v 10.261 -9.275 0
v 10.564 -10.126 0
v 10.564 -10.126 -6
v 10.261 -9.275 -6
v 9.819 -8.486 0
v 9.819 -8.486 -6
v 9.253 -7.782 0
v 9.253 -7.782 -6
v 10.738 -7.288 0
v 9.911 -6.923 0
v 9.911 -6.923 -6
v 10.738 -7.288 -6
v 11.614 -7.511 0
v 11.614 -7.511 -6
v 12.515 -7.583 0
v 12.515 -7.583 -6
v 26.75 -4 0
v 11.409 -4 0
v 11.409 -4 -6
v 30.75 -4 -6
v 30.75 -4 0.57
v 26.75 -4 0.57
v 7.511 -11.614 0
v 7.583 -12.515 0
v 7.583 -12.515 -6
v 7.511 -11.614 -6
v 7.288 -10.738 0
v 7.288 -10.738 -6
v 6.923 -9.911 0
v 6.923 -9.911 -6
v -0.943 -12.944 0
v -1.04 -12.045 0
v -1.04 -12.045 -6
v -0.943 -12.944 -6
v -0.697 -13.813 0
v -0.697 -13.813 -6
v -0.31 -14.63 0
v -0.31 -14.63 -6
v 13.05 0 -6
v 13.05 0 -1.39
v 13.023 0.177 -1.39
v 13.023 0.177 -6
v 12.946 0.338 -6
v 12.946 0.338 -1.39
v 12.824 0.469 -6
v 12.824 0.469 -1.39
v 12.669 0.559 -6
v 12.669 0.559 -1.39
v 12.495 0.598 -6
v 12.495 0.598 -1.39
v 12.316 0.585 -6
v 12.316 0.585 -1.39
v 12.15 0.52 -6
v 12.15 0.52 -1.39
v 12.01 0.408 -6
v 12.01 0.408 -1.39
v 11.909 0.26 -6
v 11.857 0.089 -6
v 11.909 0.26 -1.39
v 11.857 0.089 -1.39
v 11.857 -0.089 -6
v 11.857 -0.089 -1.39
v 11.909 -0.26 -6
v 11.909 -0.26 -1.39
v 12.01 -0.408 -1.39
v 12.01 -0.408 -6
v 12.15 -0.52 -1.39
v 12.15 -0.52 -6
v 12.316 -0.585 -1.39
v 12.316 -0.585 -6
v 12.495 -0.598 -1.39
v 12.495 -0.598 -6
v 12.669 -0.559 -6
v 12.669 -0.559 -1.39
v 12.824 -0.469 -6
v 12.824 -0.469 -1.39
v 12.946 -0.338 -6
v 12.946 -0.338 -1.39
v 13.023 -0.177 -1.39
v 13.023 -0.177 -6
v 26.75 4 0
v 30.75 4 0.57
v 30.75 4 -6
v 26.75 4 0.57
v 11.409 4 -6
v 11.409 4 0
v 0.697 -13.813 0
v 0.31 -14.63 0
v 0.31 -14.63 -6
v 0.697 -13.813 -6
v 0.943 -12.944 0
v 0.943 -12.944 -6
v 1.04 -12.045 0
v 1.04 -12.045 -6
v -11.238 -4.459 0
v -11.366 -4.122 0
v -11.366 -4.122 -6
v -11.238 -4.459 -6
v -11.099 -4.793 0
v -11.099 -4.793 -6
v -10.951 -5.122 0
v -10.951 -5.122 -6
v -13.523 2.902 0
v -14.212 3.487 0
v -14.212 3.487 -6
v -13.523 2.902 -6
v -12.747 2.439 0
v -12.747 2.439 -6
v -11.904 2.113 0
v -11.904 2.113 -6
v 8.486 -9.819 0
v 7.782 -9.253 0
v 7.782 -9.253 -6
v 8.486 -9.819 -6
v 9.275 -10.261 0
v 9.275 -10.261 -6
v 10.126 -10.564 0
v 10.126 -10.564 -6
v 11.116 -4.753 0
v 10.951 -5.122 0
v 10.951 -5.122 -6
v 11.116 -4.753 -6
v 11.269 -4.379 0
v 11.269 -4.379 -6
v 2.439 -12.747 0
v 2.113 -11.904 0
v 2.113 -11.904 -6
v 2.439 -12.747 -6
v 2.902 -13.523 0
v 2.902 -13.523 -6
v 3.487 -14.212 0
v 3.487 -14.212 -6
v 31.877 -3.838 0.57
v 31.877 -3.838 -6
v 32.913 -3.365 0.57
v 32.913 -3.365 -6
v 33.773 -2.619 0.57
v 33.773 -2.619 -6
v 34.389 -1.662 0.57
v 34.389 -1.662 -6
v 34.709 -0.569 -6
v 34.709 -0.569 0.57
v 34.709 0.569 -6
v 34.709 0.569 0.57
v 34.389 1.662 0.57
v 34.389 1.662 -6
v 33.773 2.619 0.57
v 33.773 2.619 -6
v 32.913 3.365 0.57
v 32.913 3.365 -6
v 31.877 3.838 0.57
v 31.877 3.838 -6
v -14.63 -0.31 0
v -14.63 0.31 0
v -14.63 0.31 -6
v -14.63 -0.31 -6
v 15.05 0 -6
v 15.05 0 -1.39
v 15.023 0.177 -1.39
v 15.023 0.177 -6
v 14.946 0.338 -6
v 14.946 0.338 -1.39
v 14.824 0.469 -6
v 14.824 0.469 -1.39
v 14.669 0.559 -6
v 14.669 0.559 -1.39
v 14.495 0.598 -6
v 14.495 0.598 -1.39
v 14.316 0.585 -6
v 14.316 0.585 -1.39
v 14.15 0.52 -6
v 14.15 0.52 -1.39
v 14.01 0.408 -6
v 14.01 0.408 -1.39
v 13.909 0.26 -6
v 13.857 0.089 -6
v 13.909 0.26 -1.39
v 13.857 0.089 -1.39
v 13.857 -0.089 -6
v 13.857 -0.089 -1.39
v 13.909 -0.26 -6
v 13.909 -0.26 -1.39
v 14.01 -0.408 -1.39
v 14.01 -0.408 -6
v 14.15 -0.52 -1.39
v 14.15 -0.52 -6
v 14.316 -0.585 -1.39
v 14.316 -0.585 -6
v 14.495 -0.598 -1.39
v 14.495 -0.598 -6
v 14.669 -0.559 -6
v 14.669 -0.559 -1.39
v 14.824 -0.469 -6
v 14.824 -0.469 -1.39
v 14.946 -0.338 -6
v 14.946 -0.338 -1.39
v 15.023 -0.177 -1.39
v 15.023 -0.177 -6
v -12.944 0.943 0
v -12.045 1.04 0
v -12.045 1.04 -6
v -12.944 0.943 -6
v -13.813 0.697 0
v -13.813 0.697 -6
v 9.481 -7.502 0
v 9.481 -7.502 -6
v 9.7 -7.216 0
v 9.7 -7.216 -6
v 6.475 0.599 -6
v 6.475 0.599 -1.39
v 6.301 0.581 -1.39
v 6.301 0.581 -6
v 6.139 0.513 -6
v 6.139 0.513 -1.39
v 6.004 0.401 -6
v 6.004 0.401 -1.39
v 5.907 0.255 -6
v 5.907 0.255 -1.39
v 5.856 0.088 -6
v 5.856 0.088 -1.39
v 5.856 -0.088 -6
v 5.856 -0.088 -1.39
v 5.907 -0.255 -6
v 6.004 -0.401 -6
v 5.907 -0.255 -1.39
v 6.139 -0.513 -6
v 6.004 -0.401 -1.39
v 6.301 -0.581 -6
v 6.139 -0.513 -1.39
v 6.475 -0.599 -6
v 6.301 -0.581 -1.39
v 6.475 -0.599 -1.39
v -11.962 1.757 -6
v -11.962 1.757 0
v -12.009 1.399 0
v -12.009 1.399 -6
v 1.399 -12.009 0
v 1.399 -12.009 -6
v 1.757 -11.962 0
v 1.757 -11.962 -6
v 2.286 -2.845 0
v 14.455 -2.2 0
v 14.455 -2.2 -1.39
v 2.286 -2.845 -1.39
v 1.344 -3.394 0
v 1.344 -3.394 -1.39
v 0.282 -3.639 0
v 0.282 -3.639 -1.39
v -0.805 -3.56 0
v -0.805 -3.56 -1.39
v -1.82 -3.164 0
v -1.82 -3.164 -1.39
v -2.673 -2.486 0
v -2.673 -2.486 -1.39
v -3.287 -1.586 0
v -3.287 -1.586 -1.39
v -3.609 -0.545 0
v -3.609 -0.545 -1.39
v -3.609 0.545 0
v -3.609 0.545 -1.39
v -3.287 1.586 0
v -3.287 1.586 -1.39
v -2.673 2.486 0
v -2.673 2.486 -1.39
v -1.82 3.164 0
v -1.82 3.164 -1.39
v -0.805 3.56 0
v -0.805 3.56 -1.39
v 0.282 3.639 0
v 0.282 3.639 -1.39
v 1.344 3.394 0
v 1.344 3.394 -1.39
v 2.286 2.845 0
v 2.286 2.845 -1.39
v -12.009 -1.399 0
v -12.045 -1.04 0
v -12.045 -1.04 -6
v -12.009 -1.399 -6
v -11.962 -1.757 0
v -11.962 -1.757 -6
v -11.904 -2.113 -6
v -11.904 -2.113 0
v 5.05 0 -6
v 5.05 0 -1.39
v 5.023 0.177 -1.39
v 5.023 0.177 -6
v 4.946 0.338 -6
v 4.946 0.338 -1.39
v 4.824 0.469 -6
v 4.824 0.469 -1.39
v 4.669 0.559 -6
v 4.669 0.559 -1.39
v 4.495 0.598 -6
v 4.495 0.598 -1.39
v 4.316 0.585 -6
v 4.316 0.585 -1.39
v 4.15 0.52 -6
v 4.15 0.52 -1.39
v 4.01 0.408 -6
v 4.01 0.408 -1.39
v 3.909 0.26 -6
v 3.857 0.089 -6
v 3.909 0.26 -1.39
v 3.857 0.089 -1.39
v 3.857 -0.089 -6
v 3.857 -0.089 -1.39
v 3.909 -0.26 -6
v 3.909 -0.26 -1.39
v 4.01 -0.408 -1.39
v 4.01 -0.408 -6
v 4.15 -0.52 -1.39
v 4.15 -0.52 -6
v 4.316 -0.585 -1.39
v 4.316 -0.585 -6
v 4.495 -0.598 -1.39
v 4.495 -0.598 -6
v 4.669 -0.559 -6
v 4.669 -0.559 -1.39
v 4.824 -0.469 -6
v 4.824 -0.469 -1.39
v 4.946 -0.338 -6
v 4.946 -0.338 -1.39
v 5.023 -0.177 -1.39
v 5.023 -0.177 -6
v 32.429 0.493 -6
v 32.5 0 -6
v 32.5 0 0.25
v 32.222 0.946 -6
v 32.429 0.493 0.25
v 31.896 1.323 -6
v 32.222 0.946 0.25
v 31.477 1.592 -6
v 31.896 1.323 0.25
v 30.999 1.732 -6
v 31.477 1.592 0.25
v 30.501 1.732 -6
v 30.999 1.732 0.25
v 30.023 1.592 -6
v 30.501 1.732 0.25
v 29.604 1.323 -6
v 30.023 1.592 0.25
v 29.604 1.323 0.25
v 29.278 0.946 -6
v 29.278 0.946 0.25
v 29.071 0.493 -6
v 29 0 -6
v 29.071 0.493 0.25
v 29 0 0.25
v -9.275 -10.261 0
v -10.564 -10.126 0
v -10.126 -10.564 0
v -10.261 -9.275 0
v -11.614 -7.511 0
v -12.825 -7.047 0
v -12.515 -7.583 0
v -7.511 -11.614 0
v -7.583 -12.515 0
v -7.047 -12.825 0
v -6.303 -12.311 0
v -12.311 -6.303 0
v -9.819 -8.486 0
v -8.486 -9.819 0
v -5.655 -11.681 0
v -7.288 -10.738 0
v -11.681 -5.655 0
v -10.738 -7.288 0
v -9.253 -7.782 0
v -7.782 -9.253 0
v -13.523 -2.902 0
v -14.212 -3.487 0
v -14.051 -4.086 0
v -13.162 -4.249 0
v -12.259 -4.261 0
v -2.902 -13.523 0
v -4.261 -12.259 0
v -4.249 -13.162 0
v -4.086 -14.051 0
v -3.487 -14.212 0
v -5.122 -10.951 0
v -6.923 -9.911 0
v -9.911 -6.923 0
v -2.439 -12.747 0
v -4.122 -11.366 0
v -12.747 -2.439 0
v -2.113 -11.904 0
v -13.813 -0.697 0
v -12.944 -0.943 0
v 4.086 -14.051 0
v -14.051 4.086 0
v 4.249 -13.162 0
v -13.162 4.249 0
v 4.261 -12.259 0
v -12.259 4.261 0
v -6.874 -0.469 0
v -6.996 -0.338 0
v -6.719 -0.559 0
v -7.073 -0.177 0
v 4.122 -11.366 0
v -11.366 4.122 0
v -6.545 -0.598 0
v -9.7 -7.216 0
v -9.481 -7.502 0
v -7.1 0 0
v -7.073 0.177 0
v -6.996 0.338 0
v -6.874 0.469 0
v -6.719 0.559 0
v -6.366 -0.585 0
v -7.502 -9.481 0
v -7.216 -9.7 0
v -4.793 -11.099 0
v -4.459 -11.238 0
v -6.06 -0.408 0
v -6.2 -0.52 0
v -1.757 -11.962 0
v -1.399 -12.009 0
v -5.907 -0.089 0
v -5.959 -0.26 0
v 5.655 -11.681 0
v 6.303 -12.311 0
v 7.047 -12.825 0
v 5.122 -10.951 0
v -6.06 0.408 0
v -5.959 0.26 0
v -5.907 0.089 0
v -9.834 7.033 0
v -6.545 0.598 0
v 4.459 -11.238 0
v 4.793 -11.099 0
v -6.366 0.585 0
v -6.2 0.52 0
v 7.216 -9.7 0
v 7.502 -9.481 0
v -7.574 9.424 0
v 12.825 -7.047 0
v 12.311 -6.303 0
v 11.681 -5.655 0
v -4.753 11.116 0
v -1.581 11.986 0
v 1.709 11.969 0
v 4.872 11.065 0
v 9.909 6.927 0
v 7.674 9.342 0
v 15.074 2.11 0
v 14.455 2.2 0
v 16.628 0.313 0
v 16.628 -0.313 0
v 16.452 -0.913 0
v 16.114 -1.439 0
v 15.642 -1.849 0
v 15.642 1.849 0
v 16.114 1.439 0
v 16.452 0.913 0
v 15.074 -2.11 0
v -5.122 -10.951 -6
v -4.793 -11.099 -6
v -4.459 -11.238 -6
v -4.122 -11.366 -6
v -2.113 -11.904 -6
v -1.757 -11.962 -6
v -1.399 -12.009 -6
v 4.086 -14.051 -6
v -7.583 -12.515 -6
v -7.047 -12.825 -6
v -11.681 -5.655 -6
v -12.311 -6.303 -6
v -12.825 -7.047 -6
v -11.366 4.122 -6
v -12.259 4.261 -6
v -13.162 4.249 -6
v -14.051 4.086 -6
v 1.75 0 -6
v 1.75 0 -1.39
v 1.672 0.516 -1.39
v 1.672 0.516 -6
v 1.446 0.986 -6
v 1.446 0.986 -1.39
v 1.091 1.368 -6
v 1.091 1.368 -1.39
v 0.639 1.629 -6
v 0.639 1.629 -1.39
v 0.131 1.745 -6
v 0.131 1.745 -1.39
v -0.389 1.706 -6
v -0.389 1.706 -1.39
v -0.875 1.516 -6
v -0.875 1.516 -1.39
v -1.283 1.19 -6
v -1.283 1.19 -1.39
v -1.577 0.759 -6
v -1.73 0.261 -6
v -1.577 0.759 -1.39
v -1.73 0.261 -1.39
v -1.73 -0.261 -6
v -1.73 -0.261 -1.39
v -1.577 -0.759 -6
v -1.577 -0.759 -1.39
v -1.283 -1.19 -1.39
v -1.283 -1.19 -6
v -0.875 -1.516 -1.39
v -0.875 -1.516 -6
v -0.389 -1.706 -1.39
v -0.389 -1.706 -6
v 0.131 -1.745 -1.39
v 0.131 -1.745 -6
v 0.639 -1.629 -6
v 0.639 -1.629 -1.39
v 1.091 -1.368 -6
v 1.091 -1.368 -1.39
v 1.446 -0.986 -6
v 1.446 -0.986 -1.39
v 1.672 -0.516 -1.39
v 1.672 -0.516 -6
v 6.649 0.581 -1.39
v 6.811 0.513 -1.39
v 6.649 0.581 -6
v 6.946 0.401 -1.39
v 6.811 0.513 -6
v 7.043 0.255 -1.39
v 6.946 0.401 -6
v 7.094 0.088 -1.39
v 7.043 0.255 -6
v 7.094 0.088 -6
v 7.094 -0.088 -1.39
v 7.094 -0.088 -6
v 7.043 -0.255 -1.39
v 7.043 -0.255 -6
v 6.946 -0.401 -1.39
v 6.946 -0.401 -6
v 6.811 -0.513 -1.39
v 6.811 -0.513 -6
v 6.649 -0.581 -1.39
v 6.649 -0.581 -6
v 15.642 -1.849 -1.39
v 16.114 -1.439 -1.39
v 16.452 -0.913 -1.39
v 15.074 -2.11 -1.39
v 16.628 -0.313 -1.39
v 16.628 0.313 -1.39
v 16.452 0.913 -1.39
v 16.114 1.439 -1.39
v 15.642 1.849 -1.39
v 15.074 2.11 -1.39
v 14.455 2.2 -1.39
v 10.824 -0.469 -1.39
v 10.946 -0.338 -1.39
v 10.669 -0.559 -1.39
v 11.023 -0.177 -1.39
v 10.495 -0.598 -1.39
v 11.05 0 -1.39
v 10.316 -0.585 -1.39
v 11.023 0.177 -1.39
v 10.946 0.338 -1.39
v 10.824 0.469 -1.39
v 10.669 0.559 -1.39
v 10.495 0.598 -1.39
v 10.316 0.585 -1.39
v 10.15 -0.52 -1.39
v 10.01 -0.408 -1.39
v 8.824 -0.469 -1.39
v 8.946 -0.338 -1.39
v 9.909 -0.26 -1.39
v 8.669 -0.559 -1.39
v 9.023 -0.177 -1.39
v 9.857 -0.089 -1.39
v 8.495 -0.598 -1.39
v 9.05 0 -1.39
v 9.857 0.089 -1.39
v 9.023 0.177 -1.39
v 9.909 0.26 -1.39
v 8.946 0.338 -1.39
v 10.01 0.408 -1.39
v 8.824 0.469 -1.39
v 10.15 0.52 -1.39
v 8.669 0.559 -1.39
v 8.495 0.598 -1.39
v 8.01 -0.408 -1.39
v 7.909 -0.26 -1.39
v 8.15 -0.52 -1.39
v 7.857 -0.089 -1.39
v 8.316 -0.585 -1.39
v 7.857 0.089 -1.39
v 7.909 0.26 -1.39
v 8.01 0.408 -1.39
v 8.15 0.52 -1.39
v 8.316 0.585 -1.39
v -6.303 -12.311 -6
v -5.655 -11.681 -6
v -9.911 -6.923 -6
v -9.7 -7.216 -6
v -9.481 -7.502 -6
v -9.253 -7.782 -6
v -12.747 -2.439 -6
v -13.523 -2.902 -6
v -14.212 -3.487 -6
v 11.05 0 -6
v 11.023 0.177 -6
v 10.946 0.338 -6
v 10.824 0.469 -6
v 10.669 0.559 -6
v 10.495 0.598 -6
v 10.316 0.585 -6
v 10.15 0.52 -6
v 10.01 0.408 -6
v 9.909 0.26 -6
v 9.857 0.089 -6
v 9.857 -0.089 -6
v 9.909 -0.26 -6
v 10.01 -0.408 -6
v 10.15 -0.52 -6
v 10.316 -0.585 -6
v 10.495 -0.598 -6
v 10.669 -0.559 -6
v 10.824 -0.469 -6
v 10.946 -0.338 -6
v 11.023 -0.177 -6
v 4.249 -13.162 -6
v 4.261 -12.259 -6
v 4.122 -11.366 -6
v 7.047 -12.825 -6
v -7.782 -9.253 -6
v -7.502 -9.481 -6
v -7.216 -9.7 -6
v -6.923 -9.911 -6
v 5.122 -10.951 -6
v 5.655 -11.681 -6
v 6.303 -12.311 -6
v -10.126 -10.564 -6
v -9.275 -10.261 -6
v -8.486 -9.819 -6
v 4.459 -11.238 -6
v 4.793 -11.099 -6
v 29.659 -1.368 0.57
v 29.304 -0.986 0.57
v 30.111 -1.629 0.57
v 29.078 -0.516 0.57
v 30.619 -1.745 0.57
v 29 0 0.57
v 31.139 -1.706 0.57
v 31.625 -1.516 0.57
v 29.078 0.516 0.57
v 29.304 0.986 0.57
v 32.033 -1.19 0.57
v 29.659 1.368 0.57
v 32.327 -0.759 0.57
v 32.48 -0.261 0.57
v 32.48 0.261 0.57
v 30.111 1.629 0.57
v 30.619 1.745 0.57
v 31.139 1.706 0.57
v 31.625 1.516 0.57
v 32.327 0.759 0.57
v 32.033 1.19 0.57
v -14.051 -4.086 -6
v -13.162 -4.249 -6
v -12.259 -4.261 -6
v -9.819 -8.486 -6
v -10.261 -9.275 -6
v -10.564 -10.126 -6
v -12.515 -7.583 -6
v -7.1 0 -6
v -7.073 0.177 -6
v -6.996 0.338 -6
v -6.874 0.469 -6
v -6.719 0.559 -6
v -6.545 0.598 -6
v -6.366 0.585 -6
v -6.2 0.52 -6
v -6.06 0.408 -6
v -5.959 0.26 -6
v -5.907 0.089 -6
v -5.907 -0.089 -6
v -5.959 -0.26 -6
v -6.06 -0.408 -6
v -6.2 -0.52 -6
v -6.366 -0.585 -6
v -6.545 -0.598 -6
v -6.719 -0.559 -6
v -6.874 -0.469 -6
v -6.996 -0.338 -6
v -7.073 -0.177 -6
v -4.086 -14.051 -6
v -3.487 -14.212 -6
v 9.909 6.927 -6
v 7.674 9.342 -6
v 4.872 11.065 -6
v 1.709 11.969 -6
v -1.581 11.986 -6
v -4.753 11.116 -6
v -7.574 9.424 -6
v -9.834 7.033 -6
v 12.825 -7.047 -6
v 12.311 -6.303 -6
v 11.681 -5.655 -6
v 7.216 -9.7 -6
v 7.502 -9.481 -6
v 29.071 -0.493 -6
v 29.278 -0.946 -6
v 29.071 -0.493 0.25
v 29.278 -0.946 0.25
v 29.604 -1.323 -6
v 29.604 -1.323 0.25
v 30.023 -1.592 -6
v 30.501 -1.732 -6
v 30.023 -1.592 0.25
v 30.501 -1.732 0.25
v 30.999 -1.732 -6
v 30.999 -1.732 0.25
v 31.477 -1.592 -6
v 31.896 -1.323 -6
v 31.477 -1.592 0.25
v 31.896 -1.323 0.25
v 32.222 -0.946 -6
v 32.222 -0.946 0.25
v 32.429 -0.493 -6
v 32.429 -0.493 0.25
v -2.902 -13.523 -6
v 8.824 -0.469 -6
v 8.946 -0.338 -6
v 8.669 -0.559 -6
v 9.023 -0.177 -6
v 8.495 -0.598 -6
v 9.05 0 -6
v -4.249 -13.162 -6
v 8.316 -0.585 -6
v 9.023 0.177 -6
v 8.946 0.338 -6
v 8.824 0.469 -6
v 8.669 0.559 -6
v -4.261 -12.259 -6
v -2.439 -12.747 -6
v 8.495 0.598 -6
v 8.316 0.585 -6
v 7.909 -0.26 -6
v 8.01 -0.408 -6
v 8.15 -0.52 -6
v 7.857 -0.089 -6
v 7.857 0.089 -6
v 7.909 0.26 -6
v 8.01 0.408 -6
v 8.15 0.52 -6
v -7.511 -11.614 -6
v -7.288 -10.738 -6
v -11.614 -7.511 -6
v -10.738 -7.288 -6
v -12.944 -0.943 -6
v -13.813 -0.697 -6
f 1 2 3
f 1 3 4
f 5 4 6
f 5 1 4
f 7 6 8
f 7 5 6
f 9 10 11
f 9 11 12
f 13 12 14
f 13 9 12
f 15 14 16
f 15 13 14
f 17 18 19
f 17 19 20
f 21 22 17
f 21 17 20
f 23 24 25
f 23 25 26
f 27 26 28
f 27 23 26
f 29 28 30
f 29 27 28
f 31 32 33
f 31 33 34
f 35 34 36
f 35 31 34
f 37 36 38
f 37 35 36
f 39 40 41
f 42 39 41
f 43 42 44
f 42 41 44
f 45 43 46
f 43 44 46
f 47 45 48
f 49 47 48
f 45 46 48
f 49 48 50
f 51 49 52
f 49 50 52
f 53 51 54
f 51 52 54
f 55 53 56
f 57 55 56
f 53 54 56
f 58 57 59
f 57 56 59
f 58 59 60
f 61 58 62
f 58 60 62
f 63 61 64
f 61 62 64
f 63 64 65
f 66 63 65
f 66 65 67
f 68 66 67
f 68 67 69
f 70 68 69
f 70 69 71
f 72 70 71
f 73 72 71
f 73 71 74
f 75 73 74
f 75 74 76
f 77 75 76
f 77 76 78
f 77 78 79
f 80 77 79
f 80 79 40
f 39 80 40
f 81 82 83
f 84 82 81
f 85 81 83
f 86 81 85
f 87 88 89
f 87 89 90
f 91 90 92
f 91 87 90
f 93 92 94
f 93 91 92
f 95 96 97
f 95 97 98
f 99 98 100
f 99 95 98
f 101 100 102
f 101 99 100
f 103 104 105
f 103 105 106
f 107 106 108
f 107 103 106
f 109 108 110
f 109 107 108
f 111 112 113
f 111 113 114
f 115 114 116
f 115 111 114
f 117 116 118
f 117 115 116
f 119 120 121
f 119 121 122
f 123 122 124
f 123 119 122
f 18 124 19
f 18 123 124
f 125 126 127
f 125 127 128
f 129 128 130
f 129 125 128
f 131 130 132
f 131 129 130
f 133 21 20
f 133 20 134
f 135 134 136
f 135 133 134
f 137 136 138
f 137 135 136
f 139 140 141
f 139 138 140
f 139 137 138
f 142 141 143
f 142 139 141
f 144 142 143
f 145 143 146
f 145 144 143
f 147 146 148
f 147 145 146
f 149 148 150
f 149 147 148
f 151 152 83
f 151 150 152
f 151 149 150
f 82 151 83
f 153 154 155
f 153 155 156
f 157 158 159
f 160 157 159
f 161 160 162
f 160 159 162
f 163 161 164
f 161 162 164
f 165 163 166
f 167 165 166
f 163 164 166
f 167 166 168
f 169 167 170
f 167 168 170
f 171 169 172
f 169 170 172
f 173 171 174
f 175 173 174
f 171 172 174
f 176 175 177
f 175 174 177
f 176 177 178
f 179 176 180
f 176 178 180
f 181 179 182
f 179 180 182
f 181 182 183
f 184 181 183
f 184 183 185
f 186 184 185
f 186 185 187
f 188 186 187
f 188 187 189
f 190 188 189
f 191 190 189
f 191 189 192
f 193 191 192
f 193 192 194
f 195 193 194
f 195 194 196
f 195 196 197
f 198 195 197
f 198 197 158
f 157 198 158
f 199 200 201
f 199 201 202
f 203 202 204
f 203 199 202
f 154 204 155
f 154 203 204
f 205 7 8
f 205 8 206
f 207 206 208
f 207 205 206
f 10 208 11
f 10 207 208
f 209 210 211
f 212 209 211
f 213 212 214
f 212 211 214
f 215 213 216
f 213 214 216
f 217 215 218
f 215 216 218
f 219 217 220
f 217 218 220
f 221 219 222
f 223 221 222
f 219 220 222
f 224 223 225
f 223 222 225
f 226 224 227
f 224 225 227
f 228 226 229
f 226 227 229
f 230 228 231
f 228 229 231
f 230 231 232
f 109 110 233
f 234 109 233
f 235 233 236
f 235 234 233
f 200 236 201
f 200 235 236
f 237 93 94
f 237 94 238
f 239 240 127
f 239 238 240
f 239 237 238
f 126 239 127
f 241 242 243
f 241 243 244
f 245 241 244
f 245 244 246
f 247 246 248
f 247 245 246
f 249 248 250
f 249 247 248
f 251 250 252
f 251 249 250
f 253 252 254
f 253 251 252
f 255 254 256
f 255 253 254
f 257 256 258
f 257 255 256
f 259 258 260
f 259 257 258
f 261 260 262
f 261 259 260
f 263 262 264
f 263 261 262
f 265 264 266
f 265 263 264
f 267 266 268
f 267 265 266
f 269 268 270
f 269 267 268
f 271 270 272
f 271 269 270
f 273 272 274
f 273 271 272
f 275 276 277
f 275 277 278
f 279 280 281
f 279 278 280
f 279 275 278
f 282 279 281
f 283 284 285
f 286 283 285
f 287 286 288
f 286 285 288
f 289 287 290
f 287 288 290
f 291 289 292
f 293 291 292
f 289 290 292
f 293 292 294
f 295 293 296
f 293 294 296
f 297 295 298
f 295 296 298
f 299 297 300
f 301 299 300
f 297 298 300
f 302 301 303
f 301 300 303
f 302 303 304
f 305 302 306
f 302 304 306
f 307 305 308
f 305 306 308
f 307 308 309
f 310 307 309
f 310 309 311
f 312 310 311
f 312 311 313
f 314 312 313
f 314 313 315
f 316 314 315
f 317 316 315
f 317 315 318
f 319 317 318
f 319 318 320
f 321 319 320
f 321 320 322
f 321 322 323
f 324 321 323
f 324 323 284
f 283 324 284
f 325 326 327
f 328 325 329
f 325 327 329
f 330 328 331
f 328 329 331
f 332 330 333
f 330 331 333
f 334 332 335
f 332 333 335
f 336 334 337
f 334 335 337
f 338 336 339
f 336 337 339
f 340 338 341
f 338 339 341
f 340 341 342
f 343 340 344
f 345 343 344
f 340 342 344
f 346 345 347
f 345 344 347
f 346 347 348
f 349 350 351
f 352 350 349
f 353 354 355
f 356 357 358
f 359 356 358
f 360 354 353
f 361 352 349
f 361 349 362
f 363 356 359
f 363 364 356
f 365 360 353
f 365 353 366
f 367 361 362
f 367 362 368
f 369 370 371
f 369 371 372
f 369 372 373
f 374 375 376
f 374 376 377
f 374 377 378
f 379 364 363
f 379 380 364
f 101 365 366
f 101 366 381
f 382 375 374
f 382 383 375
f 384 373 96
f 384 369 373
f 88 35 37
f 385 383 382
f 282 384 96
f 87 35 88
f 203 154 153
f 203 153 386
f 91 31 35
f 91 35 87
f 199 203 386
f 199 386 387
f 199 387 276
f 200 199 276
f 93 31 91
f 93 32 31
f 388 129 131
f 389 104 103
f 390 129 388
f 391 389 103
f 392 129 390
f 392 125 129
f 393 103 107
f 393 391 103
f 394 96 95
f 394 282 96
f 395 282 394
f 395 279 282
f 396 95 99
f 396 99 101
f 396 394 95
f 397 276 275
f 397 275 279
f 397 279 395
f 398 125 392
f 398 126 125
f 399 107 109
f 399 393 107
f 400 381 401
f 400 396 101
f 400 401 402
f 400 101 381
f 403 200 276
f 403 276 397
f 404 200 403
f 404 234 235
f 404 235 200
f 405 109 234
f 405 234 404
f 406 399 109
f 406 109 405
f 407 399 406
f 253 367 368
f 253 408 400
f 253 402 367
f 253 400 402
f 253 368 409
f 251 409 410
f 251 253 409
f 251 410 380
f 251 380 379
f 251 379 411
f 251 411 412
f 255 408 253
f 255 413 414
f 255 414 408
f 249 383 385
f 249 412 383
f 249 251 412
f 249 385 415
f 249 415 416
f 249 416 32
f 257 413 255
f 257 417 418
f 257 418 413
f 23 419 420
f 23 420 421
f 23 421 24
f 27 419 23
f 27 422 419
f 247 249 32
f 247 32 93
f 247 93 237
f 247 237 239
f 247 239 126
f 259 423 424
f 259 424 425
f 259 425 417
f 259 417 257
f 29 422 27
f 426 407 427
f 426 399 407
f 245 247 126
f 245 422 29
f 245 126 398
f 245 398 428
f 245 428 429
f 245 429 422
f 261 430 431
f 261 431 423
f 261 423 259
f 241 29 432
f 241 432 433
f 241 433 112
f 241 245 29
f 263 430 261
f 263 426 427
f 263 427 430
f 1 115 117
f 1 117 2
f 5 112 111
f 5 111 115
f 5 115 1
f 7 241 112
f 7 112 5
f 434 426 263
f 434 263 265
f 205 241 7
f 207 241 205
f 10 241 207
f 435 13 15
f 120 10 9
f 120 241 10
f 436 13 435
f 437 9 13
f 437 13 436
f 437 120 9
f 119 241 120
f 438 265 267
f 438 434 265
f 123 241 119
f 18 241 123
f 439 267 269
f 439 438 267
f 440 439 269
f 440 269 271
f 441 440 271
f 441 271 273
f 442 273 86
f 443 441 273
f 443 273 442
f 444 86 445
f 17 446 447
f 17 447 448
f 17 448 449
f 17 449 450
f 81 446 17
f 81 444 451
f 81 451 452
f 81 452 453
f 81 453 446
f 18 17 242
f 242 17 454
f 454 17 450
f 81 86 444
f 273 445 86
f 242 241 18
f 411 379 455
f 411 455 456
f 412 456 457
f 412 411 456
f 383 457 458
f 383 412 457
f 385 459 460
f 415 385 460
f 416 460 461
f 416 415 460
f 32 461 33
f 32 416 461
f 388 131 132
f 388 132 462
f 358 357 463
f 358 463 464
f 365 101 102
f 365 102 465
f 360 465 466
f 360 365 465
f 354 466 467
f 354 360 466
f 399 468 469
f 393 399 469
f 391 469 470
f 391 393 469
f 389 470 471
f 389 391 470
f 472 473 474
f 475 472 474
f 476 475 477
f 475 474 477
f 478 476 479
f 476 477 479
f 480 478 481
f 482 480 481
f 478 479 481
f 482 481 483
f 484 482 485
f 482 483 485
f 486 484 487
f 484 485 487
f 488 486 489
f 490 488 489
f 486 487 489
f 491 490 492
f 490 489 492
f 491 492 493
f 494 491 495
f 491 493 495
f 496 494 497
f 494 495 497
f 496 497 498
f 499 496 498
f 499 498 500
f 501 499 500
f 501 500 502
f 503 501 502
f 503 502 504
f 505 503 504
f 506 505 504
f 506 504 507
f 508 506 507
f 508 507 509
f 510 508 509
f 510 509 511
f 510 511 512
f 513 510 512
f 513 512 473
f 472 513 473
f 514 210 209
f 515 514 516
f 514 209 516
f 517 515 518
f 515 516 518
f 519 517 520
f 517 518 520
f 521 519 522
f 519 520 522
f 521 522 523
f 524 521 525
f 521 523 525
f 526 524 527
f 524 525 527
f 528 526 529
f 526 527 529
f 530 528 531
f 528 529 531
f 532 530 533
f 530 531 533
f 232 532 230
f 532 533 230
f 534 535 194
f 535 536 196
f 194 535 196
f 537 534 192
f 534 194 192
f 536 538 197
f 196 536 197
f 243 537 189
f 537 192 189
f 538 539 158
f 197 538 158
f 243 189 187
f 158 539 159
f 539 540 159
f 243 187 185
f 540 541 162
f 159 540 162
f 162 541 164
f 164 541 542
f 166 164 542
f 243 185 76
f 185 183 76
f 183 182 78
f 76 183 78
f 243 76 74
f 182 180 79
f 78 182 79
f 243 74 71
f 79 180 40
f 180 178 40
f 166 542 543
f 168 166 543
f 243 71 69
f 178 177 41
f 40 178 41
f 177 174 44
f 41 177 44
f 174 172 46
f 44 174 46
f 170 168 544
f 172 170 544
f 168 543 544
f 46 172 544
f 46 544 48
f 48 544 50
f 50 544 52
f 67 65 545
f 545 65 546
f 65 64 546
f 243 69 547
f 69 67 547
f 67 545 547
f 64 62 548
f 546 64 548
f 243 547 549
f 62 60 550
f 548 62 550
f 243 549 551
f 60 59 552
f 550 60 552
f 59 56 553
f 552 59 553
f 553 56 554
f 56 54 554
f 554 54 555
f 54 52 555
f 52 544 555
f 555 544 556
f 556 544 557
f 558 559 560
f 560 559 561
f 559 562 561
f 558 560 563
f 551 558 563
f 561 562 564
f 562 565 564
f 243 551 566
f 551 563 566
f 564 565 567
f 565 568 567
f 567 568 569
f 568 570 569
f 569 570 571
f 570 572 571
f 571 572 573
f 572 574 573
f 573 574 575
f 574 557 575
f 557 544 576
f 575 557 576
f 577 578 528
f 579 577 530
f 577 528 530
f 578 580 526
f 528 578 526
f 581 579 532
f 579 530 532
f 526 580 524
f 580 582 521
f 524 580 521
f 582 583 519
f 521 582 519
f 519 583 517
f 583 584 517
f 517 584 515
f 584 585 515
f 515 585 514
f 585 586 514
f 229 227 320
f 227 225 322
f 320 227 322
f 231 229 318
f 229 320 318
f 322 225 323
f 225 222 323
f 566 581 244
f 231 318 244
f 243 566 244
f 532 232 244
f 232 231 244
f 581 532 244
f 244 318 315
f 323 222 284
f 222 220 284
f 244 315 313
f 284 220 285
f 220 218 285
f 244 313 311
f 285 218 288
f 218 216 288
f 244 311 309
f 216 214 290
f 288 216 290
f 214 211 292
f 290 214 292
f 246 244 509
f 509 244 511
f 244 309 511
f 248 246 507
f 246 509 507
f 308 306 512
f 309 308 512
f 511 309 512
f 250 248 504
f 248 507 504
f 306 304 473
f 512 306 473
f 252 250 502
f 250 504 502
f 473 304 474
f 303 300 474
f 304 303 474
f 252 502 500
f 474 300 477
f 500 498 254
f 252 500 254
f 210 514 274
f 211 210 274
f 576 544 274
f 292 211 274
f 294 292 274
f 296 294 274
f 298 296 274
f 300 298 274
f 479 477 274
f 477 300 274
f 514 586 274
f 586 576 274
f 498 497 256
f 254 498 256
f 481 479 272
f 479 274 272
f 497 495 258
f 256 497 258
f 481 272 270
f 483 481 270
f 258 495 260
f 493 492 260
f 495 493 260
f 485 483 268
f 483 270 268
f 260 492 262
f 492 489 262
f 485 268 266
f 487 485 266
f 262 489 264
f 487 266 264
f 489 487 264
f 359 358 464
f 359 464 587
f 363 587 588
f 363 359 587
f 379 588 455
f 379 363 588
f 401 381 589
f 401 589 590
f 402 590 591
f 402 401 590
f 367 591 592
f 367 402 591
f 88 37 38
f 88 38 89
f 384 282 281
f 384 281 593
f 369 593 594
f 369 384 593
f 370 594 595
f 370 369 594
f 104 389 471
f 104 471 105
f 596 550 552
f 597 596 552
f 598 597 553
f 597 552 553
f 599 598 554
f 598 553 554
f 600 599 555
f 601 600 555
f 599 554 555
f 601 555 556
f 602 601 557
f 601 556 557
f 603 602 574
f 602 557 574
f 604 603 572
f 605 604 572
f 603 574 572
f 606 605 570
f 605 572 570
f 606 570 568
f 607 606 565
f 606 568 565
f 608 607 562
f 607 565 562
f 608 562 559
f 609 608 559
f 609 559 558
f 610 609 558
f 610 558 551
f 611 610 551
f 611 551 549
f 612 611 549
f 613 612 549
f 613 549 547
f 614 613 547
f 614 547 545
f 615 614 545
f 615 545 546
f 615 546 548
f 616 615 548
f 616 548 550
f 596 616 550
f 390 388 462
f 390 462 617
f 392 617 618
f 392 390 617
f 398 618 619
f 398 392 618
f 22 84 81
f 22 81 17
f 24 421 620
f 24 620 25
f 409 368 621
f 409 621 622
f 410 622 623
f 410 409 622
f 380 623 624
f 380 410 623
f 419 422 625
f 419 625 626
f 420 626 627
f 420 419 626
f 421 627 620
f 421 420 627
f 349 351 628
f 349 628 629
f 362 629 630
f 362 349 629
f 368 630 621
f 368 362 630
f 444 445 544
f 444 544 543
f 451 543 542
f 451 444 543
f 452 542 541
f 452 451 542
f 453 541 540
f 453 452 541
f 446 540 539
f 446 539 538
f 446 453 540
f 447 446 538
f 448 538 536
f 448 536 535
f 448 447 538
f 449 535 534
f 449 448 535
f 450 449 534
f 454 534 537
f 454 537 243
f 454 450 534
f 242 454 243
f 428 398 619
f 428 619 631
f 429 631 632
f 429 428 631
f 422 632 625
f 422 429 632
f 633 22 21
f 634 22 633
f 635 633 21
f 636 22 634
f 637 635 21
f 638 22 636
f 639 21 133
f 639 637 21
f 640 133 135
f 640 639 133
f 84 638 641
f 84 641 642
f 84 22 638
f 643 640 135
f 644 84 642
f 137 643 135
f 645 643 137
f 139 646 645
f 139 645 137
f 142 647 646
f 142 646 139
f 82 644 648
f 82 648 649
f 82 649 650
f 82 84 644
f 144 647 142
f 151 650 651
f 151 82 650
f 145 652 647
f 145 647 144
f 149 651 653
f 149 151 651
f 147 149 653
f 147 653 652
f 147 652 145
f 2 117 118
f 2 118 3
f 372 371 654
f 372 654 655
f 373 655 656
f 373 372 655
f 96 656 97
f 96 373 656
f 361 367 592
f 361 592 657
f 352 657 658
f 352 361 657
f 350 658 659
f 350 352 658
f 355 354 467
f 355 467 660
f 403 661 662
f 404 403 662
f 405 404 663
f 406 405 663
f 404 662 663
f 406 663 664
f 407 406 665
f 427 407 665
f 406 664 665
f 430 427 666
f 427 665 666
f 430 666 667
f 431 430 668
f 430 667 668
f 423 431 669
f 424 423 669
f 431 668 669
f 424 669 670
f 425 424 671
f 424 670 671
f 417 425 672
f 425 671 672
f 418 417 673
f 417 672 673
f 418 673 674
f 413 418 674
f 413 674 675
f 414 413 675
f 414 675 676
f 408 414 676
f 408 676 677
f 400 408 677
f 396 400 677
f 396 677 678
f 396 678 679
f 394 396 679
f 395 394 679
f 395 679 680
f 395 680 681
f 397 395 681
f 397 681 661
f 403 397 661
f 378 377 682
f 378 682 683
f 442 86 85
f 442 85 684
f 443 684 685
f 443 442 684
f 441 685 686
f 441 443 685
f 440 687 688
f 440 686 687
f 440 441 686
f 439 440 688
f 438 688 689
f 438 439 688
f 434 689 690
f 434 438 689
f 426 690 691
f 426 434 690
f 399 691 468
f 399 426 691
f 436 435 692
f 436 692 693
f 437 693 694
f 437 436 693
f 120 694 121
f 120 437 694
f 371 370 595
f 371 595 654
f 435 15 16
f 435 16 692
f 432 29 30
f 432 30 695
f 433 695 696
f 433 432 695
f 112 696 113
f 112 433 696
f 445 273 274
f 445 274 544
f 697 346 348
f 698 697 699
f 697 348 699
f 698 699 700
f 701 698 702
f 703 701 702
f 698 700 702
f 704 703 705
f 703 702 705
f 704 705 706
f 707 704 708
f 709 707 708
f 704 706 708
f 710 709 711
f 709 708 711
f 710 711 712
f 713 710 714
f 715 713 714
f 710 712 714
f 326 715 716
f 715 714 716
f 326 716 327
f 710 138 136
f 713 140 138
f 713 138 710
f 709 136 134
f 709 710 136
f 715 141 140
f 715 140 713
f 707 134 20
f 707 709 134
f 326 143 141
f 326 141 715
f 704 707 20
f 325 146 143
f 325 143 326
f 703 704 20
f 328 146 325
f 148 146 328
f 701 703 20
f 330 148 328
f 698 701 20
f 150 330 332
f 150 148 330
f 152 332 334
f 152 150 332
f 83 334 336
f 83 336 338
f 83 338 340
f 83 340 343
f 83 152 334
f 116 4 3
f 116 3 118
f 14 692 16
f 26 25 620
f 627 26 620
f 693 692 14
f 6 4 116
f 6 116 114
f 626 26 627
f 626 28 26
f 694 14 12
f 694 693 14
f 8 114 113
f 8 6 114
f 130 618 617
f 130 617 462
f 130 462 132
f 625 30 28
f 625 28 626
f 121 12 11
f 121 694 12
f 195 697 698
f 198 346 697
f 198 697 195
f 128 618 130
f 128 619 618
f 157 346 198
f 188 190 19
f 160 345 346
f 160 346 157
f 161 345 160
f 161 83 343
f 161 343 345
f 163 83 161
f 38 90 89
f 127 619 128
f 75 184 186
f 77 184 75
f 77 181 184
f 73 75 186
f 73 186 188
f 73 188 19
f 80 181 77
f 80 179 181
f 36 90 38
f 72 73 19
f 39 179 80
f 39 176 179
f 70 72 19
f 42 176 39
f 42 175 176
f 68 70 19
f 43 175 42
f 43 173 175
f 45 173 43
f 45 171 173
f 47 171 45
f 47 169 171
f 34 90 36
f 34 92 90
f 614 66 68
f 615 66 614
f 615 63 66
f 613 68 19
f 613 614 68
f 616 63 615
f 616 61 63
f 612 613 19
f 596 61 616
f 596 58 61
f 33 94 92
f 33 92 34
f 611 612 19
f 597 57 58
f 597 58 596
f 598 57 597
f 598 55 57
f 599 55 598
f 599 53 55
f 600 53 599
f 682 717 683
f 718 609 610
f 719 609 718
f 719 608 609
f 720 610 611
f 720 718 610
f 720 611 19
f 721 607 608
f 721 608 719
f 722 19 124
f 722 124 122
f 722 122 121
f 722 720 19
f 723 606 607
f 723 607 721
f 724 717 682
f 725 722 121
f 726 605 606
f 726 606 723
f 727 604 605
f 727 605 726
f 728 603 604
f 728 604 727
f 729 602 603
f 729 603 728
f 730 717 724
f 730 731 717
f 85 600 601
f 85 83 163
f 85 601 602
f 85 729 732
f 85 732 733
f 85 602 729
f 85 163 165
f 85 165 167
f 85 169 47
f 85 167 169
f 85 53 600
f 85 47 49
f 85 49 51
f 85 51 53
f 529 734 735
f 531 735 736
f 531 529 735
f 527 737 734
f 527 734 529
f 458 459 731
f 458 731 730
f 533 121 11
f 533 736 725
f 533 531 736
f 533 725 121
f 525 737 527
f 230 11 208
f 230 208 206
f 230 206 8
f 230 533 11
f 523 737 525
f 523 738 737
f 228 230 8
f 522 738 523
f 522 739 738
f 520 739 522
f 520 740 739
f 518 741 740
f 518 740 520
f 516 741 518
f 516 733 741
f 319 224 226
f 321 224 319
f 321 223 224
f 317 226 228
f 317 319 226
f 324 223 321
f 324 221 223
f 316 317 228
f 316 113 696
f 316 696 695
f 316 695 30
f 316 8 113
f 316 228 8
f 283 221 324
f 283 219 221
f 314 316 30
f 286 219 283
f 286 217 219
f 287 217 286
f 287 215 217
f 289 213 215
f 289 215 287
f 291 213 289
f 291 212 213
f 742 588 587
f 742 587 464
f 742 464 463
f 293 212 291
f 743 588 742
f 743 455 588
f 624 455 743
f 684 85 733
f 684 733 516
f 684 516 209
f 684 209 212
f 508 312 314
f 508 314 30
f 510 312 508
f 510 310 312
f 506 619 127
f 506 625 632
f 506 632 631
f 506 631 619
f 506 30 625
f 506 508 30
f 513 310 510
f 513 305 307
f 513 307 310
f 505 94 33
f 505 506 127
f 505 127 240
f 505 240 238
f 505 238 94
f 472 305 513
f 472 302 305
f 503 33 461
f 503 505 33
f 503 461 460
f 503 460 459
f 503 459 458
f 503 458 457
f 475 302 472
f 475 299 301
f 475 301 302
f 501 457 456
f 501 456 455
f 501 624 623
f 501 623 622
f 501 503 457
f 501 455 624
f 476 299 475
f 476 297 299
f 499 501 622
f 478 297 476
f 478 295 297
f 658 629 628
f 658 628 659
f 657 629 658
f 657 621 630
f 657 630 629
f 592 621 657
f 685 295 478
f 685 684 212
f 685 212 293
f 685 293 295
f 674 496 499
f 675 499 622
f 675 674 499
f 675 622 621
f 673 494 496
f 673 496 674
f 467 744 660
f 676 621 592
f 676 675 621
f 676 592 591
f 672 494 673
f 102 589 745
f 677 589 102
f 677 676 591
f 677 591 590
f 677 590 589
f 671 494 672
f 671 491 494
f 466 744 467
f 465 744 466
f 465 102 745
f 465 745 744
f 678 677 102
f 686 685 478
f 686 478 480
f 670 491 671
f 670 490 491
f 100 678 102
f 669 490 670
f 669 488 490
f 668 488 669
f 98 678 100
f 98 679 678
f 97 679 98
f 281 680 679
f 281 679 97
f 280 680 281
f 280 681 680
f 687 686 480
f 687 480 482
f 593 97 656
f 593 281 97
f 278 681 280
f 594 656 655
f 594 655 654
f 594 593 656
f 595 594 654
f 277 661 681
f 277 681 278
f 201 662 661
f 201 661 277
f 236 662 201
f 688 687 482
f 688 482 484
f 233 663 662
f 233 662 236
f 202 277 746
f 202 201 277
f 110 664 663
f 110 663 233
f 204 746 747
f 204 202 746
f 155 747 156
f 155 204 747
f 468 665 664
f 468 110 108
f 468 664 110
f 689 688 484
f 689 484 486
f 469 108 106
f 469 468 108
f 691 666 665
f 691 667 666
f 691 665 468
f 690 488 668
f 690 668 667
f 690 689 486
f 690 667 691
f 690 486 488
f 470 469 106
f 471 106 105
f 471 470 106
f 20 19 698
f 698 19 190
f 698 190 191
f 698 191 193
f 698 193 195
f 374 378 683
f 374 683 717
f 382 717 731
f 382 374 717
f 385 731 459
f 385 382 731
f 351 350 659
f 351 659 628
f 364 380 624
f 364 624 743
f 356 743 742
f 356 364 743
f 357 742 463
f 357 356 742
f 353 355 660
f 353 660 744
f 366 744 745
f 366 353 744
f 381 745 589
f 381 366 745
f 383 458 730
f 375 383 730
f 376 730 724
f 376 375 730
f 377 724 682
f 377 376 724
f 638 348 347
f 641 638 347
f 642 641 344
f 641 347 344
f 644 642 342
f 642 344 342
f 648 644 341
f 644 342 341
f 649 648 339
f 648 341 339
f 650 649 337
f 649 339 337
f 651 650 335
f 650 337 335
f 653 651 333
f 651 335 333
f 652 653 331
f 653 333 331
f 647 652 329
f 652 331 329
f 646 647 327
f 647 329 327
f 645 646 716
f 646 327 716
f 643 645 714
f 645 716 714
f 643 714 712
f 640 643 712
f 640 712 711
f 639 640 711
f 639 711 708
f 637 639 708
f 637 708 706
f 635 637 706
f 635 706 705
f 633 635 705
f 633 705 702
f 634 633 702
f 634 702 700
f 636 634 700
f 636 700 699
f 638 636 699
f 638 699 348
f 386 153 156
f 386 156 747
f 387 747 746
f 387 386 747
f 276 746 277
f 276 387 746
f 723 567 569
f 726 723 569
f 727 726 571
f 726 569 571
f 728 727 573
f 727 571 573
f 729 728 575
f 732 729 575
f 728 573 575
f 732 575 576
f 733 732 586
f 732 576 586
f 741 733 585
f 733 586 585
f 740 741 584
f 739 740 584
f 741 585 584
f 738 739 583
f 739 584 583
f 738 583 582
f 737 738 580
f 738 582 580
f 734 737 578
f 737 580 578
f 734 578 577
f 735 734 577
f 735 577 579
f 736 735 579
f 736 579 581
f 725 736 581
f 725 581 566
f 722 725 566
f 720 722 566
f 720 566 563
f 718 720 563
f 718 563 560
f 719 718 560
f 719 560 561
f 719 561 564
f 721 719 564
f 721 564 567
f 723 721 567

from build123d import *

# Parameters (mm, degrees)
SKETCH2_R           = 1.75
BOSS_EXTRUDE1_DEPTH = 10
SKETCH10_R          = 0.6
CUT_EXTRUDE1_DEPTH  = 40.007683858
CUT_EXTRUDE3_START  = -4
CUT_EXTRUDE3_DEPTH  = 4
BOSS_EXTRUDE2_START = 0.25
BOSS_EXTRUDE2_DEPTH = 0.25
SKETCH13_R          = 1.75
CUT_EXTRUDE11_DEPTH = 39.178520139
SKETCH28_R          = 0.6
CUT_EXTRUDE12_DEPTH = 39.178520139
CUT_EXTRUDE14_DEPTH = 1.39
BOSS_EXTRUDE3_START = 0.32
BOSS_EXTRUDE3_DEPTH = 0.32
SKETCH32_R          = 1.75
CUT_EXTRUDE18_DEPTH = 39.272239286


with BuildPart() as part:
    # Sketch2 → Boss-Extrude1 (new body)
    with BuildSketch(Plane.XY):
        with BuildLine():
            ThreePointArc((-11.365584201, 4.122086336), (-12.71070456, 4.273667417), (-14.051260935, 4.085959636))
            Line((-14.051260935, 4.085959636), (-14.211728743, 3.487085624))
            ThreePointArc((-14.211728743, 3.487085624), (-13.144626757, 2.65424773), (-11.903927815, 2.112960617))
            ThreePointArc((-11.903927815, 2.112960617), (-11.986568374, 1.578061664), (-12.04518576, 1.04))
            ThreePointArc((-12.04518576, 1.04), (-13.383704325, 0.838273314), (-14.63, 0.31))
            Line((-14.63, 0.31), (-14.63, -0.31))
            ThreePointArc((-14.63, -0.31), (-13.383704325, -0.838273314), (-12.04518576, -1.04))
            ThreePointArc((-12.04518576, -1.04), (-11.986568374, -1.578061664), (-11.903927815, -2.112960617))
            ThreePointArc((-11.903927815, -2.112960617), (-13.144626757, -2.65424773), (-14.211728743, -3.487085624))
            Line((-14.211728743, -3.487085624), (-14.051260935, -4.085959636))
            ThreePointArc((-14.051260935, -4.085959636), (-12.71070456, -4.273667417), (-11.365584201, -4.122086336))
            ThreePointArc((-11.365584201, -4.122086336), (-11.169703548, -4.626642697), (-10.951436862, -5.12192646))
            ThreePointArc((-10.951436862, -5.12192646), (-12.009764599, -5.965886177), (-12.824951657, -7.046532125))
            Line((-12.824951657, -7.046532125), (-12.514951657, -7.583467875))
            ThreePointArc((-12.514951657, -7.583467875), (-11.171491285, -7.417818147), (-9.911436862, -6.9232593))
            ThreePointArc((-9.911436862, -6.9232593), (-9.591641884, -7.359925677), (-9.252623584, -7.781841479))
            ThreePointArc((-9.252623584, -7.781841479), (-10.05645683, -8.870959341), (-10.564175311, -10.125769107))
            Line((-10.564175311, -10.125769107), (-10.125769107, -10.564175311))
            ThreePointArc((-10.125769107, -10.564175311), (-8.870959341, -10.05645683), (-7.781841479, -9.252623584))
            ThreePointArc((-7.781841479, -9.252623584), (-7.359925677, -9.591641884), (-6.9232593, -9.911436862))
            ThreePointArc((-6.9232593, -9.911436862), (-7.417818147, -11.171491285), (-7.583467875, -12.514951657))
            Line((-7.583467875, -12.514951657), (-7.046532125, -12.824951657))
            ThreePointArc((-7.046532125, -12.824951657), (-5.965886177, -12.009764599), (-5.12192646, -10.951436862))
            ThreePointArc((-5.12192646, -10.951436862), (-4.626642697, -11.169703548), (-4.122086336, -11.365584201))
            ThreePointArc((-4.122086336, -11.365584201), (-4.273667417, -12.71070456), (-4.085959636, -14.051260935))
            Line((-4.085959636, -14.051260935), (-3.487085624, -14.211728743))
            ThreePointArc((-3.487085624, -14.211728743), (-2.65424773, -13.144626757), (-2.112960617, -11.903927815))
            ThreePointArc((-2.112960617, -11.903927815), (-1.578061664, -11.986568374), (-1.04, -12.04518576))
            ThreePointArc((-1.04, -12.04518576), (-0.838273314, -13.383704325), (-0.31, -14.63))
            Line((-0.31, -14.63), (0.31, -14.63))
            ThreePointArc((0.31, -14.63), (0.838273314, -13.383704325), (1.04, -12.04518576))
            ThreePointArc((1.04, -12.04518576), (1.578061664, -11.986568374), (2.112960617, -11.903927815))
            ThreePointArc((2.112960617, -11.903927815), (2.65424773, -13.144626757), (3.487085624, -14.211728743))
            Line((3.487085624, -14.211728743), (4.085959636, -14.051260935))
            ThreePointArc((4.085959636, -14.051260935), (4.273667417, -12.71070456), (4.122086336, -11.365584201))
            ThreePointArc((4.122086336, -11.365584201), (4.626642697, -11.169703548), (5.12192646, -10.951436862))
            ThreePointArc((5.12192646, -10.951436862), (5.965886177, -12.009764599), (7.046532125, -12.824951657))
            Line((7.046532125, -12.824951657), (7.583467875, -12.514951657))
            ThreePointArc((7.583467875, -12.514951657), (7.417818147, -11.171491285), (6.9232593, -9.911436862))
            ThreePointArc((6.9232593, -9.911436862), (7.359925677, -9.591641884), (7.781841479, -9.252623584))
            ThreePointArc((7.781841479, -9.252623584), (8.870959341, -10.05645683), (10.125769107, -10.564175311))
            Line((10.125769107, -10.564175311), (10.564175311, -10.125769107))
            ThreePointArc((10.564175311, -10.125769107), (10.05645683, -8.870959341), (9.252623584, -7.781841479))
            ThreePointArc((9.252623584, -7.781841479), (9.591641884, -7.359925677), (9.911436862, -6.9232593))
            ThreePointArc((9.911436862, -6.9232593), (11.171491285, -7.417818147), (12.514951657, -7.583467875))
            Line((12.514951657, -7.583467875), (12.824951657, -7.046532125))
            ThreePointArc((12.824951657, -7.046532125), (12.009764599, -5.965886177), (10.951436862, -5.12192646))
            ThreePointArc((10.951436862, -5.12192646), (11.194344337, -4.566700654), (11.409123542, -4))
            Line((11.409123542, -4), (30.75, -4))
            ThreePointArc((30.75, -4), (34.75, 0), (30.75, 4))
            Line((30.75, 4), (11.409123542, 4))
            ThreePointArc((11.409123542, 4), (0.064808849, 12.089826294), (-11.365584201, 4.122086336))
        make_face()
        Circle(SKETCH2_R, mode=Mode.SUBTRACT)
        with Locations((30.75, 0)):
            Circle(SKETCH2_R, mode=Mode.SUBTRACT)
    extrude(amount=-BOSS_EXTRUDE1_DEPTH)

    # Sketch10 → Cut-Extrude1 (cut, through all)
    with BuildSketch(Plane(origin=(0, 0, -10), x_dir=(-1, 0, 0), z_dir=(0, 0, -1))):
        with Locations((6.5, 0)):
            Circle(SKETCH10_R)
        with Locations((-6.5, 0)):
            Circle(SKETCH10_R)
    extrude(amount=-CUT_EXTRUDE1_DEPTH, mode=Mode.SUBTRACT)

    # Sketch14 → Cut-Extrude3 (cut)
    with BuildSketch(Plane(origin=(0, 0, -10), x_dir=(-1, 0, 0), z_dir=(0, 0, -1)).offset(CUT_EXTRUDE3_START)):
        with BuildLine():
            Line((-11.409123542, 4), (-30.75, 4))
            ThreePointArc((-30.75, 4), (-34.75, 0), (-30.75, -4))
            Line((-30.75, -4), (-11.409123542, -4))
            ThreePointArc((-11.409123542, -4), (-11.194344337, -4.566700654), (-10.951436862, -5.12192646))
            ThreePointArc((-10.951436862, -5.12192646), (-12.009764599, -5.965886177), (-12.824951657, -7.046532125))
            Line((-12.824951657, -7.046532125), (-12.514951657, -7.583467875))
            ThreePointArc((-12.514951657, -7.583467875), (-11.171491285, -7.417818147), (-9.911436862, -6.9232593))
            ThreePointArc((-9.911436862, -6.9232593), (-9.591641884, -7.359925677), (-9.252623584, -7.781841479))
            ThreePointArc((-9.252623584, -7.781841479), (-10.05645683, -8.870959341), (-10.564175311, -10.125769107))
            Line((-10.564175311, -10.125769107), (-10.125769107, -10.564175311))
            ThreePointArc((-10.125769107, -10.564175311), (-8.870959341, -10.05645683), (-7.781841479, -9.252623584))
            ThreePointArc((-7.781841479, -9.252623584), (-7.359925677, -9.591641884), (-6.9232593, -9.911436862))
            ThreePointArc((-6.9232593, -9.911436862), (-7.417818147, -11.171491285), (-7.583467875, -12.514951657))
            Line((-7.583467875, -12.514951657), (-7.046532125, -12.824951657))
            ThreePointArc((-7.046532125, -12.824951657), (-5.965886177, -12.009764599), (-5.12192646, -10.951436862))
            ThreePointArc((-5.12192646, -10.951436862), (-4.626642697, -11.169703548), (-4.122086336, -11.365584201))
            ThreePointArc((-4.122086336, -11.365584201), (-4.273667417, -12.71070456), (-4.085959636, -14.051260935))
            Line((-4.085959636, -14.051260935), (-3.487085624, -14.211728743))
            ThreePointArc((-3.487085624, -14.211728743), (-2.65424773, -13.144626757), (-2.112960617, -11.903927815))
            ThreePointArc((-2.112960617, -11.903927815), (-1.578061664, -11.986568374), (-1.04, -12.04518576))
            ThreePointArc((-1.04, -12.04518576), (-0.838273314, -13.383704325), (-0.31, -14.63))
            Line((-0.31, -14.63), (0.31, -14.63))
            ThreePointArc((0.31, -14.63), (0.838273314, -13.383704325), (1.04, -12.04518576))
            ThreePointArc((1.04, -12.04518576), (1.578061664, -11.986568374), (2.112960617, -11.903927815))
            ThreePointArc((2.112960617, -11.903927815), (2.65424773, -13.144626757), (3.487085624, -14.211728743))
            Line((3.487085624, -14.211728743), (4.085959636, -14.051260935))
            ThreePointArc((4.085959636, -14.051260935), (4.273667417, -12.71070456), (4.122086336, -11.365584201))
            ThreePointArc((4.122086336, -11.365584201), (4.626642697, -11.169703548), (5.12192646, -10.951436862))
            ThreePointArc((5.12192646, -10.951436862), (5.965886177, -12.009764599), (7.046532125, -12.824951657))
            Line((7.046532125, -12.824951657), (7.583467875, -12.514951657))
            ThreePointArc((7.583467875, -12.514951657), (7.417818147, -11.171491285), (6.9232593, -9.911436862))
            ThreePointArc((6.9232593, -9.911436862), (7.359925677, -9.591641884), (7.781841479, -9.252623584))
            ThreePointArc((7.781841479, -9.252623584), (8.870959341, -10.05645683), (10.125769107, -10.564175311))
            Line((10.125769107, -10.564175311), (10.564175311, -10.125769107))
            ThreePointArc((10.564175311, -10.125769107), (10.05645683, -8.870959341), (9.252623584, -7.781841479))
            ThreePointArc((9.252623584, -7.781841479), (9.591641884, -7.359925677), (9.911436862, -6.9232593))
            ThreePointArc((9.911436862, -6.9232593), (11.171491285, -7.417818147), (12.514951657, -7.583467875))
            Line((12.514951657, -7.583467875), (12.824951657, -7.046532125))
            ThreePointArc((12.824951657, -7.046532125), (12.009764599, -5.965886177), (10.951436862, -5.12192646))
            ThreePointArc((10.951436862, -5.12192646), (11.169703548, -4.626642697), (11.365584201, -4.122086336))
            ThreePointArc((11.365584201, -4.122086336), (12.71070456, -4.273667417), (14.051260935, -4.085959636))
            Line((14.051260935, -4.085959636), (14.211728743, -3.487085624))
            ThreePointArc((14.211728743, -3.487085624), (13.144626757, -2.65424773), (11.903927815, -2.112960617))
            ThreePointArc((11.903927815, -2.112960617), (11.986568374, -1.578061664), (12.04518576, -1.04))
            ThreePointArc((12.04518576, -1.04), (13.383704325, -0.838273314), (14.63, -0.31))
            Line((14.63, -0.31), (14.63, 0.31))
            ThreePointArc((14.63, 0.31), (13.383704325, 0.838273314), (12.04518576, 1.04))
            ThreePointArc((12.04518576, 1.04), (11.986568374, 1.578061664), (11.903927815, 2.112960617))
            ThreePointArc((11.903927815, 2.112960617), (13.144626757, 2.65424773), (14.211728743, 3.487085624))
            Line((14.211728743, 3.487085624), (14.051260935, 4.085959636))
            ThreePointArc((14.051260935, 4.085959636), (12.71070456, 4.273667417), (11.365584201, 4.122086336))
            ThreePointArc((11.365584201, 4.122086336), (-0.064808849, 12.089826294), (-11.409123542, 4))
        make_face()
    extrude(amount=CUT_EXTRUDE3_DEPTH, mode=Mode.SUBTRACT)

    # Sketch26 → Boss-Extrude2 (add)
    with BuildSketch(Plane.XY.offset(BOSS_EXTRUDE2_START)):
        with BuildLine():
            Line((30.75, 4), (26.75, 4))
            Line((26.75, 4), (26.75, -4))
            Line((26.75, -4), (30.75, -4))
            ThreePointArc((30.75, -4), (34.75, 0), (30.75, 4))
        make_face()
    extrude(amount=-BOSS_EXTRUDE2_DEPTH)

    # Sketch13 → Cut-Extrude11 (cut, through all)
    with BuildSketch(Plane.XY):
        with Locations((30.75, 0)):
            Circle(SKETCH13_R)
    extrude(amount=CUT_EXTRUDE11_DEPTH, mode=Mode.SUBTRACT)

    # Sketch28 → Cut-Extrude12 (cut, through all)
    with BuildSketch(Plane.XY):
        with Locations((14.45, 0)):
            Circle(SKETCH28_R)
        with Locations((12.45, 0)):
            Circle(SKETCH28_R)
        with Locations((10.45, 0)):
            Circle(SKETCH28_R)
        with Locations((8.45, 0)):
            Circle(SKETCH28_R)
        with Locations((6.45, 0)):
            Circle(SKETCH28_R)
        with Locations((4.45, 0)):
            Circle(SKETCH28_R)
    extrude(amount=-CUT_EXTRUDE12_DEPTH, mode=Mode.SUBTRACT)

    # Sketch29 → Cut-Extrude14 (cut)
    with BuildSketch(Plane.XY):
        with BuildLine():
            Line((14.45542659, 2.199993307), (2.285992653, 2.845476689))
            ThreePointArc((2.285992653, 2.845476689), (-3.65, 0), (2.285992653, -2.845476689))
            Line((2.285992653, -2.845476689), (14.45542659, -2.199993307))
            ThreePointArc((14.45542659, -2.199993307), (16.65, 0), (14.45542659, 2.199993307))
        make_face()
    extrude(amount=-CUT_EXTRUDE14_DEPTH, mode=Mode.SUBTRACT)

    # Sketch31 → Boss-Extrude3 (add)
    with BuildSketch(Plane.XY.offset(0.25).offset(BOSS_EXTRUDE3_START)):
        with BuildLine():
            Line((26.75, -4), (30.75, -4))
            ThreePointArc((30.75, -4), (34.75, 0), (30.75, 4))
            Line((30.75, 4), (26.75, 4))
            Line((26.75, 4), (26.75, -4))
        make_face()
    extrude(amount=-BOSS_EXTRUDE3_DEPTH)

    # Sketch32 → Cut-Extrude18 (cut, through all)
    with BuildSketch(Plane(origin=(0, 0, -6), x_dir=(-1, 0, 0), z_dir=(0, 0, -1))):
        with Locations((-30.75, 0)):
            Circle(SKETCH32_R)
    extrude(amount=-CUT_EXTRUDE18_DEPTH, mode=Mode.SUBTRACT)


solid = part.part
